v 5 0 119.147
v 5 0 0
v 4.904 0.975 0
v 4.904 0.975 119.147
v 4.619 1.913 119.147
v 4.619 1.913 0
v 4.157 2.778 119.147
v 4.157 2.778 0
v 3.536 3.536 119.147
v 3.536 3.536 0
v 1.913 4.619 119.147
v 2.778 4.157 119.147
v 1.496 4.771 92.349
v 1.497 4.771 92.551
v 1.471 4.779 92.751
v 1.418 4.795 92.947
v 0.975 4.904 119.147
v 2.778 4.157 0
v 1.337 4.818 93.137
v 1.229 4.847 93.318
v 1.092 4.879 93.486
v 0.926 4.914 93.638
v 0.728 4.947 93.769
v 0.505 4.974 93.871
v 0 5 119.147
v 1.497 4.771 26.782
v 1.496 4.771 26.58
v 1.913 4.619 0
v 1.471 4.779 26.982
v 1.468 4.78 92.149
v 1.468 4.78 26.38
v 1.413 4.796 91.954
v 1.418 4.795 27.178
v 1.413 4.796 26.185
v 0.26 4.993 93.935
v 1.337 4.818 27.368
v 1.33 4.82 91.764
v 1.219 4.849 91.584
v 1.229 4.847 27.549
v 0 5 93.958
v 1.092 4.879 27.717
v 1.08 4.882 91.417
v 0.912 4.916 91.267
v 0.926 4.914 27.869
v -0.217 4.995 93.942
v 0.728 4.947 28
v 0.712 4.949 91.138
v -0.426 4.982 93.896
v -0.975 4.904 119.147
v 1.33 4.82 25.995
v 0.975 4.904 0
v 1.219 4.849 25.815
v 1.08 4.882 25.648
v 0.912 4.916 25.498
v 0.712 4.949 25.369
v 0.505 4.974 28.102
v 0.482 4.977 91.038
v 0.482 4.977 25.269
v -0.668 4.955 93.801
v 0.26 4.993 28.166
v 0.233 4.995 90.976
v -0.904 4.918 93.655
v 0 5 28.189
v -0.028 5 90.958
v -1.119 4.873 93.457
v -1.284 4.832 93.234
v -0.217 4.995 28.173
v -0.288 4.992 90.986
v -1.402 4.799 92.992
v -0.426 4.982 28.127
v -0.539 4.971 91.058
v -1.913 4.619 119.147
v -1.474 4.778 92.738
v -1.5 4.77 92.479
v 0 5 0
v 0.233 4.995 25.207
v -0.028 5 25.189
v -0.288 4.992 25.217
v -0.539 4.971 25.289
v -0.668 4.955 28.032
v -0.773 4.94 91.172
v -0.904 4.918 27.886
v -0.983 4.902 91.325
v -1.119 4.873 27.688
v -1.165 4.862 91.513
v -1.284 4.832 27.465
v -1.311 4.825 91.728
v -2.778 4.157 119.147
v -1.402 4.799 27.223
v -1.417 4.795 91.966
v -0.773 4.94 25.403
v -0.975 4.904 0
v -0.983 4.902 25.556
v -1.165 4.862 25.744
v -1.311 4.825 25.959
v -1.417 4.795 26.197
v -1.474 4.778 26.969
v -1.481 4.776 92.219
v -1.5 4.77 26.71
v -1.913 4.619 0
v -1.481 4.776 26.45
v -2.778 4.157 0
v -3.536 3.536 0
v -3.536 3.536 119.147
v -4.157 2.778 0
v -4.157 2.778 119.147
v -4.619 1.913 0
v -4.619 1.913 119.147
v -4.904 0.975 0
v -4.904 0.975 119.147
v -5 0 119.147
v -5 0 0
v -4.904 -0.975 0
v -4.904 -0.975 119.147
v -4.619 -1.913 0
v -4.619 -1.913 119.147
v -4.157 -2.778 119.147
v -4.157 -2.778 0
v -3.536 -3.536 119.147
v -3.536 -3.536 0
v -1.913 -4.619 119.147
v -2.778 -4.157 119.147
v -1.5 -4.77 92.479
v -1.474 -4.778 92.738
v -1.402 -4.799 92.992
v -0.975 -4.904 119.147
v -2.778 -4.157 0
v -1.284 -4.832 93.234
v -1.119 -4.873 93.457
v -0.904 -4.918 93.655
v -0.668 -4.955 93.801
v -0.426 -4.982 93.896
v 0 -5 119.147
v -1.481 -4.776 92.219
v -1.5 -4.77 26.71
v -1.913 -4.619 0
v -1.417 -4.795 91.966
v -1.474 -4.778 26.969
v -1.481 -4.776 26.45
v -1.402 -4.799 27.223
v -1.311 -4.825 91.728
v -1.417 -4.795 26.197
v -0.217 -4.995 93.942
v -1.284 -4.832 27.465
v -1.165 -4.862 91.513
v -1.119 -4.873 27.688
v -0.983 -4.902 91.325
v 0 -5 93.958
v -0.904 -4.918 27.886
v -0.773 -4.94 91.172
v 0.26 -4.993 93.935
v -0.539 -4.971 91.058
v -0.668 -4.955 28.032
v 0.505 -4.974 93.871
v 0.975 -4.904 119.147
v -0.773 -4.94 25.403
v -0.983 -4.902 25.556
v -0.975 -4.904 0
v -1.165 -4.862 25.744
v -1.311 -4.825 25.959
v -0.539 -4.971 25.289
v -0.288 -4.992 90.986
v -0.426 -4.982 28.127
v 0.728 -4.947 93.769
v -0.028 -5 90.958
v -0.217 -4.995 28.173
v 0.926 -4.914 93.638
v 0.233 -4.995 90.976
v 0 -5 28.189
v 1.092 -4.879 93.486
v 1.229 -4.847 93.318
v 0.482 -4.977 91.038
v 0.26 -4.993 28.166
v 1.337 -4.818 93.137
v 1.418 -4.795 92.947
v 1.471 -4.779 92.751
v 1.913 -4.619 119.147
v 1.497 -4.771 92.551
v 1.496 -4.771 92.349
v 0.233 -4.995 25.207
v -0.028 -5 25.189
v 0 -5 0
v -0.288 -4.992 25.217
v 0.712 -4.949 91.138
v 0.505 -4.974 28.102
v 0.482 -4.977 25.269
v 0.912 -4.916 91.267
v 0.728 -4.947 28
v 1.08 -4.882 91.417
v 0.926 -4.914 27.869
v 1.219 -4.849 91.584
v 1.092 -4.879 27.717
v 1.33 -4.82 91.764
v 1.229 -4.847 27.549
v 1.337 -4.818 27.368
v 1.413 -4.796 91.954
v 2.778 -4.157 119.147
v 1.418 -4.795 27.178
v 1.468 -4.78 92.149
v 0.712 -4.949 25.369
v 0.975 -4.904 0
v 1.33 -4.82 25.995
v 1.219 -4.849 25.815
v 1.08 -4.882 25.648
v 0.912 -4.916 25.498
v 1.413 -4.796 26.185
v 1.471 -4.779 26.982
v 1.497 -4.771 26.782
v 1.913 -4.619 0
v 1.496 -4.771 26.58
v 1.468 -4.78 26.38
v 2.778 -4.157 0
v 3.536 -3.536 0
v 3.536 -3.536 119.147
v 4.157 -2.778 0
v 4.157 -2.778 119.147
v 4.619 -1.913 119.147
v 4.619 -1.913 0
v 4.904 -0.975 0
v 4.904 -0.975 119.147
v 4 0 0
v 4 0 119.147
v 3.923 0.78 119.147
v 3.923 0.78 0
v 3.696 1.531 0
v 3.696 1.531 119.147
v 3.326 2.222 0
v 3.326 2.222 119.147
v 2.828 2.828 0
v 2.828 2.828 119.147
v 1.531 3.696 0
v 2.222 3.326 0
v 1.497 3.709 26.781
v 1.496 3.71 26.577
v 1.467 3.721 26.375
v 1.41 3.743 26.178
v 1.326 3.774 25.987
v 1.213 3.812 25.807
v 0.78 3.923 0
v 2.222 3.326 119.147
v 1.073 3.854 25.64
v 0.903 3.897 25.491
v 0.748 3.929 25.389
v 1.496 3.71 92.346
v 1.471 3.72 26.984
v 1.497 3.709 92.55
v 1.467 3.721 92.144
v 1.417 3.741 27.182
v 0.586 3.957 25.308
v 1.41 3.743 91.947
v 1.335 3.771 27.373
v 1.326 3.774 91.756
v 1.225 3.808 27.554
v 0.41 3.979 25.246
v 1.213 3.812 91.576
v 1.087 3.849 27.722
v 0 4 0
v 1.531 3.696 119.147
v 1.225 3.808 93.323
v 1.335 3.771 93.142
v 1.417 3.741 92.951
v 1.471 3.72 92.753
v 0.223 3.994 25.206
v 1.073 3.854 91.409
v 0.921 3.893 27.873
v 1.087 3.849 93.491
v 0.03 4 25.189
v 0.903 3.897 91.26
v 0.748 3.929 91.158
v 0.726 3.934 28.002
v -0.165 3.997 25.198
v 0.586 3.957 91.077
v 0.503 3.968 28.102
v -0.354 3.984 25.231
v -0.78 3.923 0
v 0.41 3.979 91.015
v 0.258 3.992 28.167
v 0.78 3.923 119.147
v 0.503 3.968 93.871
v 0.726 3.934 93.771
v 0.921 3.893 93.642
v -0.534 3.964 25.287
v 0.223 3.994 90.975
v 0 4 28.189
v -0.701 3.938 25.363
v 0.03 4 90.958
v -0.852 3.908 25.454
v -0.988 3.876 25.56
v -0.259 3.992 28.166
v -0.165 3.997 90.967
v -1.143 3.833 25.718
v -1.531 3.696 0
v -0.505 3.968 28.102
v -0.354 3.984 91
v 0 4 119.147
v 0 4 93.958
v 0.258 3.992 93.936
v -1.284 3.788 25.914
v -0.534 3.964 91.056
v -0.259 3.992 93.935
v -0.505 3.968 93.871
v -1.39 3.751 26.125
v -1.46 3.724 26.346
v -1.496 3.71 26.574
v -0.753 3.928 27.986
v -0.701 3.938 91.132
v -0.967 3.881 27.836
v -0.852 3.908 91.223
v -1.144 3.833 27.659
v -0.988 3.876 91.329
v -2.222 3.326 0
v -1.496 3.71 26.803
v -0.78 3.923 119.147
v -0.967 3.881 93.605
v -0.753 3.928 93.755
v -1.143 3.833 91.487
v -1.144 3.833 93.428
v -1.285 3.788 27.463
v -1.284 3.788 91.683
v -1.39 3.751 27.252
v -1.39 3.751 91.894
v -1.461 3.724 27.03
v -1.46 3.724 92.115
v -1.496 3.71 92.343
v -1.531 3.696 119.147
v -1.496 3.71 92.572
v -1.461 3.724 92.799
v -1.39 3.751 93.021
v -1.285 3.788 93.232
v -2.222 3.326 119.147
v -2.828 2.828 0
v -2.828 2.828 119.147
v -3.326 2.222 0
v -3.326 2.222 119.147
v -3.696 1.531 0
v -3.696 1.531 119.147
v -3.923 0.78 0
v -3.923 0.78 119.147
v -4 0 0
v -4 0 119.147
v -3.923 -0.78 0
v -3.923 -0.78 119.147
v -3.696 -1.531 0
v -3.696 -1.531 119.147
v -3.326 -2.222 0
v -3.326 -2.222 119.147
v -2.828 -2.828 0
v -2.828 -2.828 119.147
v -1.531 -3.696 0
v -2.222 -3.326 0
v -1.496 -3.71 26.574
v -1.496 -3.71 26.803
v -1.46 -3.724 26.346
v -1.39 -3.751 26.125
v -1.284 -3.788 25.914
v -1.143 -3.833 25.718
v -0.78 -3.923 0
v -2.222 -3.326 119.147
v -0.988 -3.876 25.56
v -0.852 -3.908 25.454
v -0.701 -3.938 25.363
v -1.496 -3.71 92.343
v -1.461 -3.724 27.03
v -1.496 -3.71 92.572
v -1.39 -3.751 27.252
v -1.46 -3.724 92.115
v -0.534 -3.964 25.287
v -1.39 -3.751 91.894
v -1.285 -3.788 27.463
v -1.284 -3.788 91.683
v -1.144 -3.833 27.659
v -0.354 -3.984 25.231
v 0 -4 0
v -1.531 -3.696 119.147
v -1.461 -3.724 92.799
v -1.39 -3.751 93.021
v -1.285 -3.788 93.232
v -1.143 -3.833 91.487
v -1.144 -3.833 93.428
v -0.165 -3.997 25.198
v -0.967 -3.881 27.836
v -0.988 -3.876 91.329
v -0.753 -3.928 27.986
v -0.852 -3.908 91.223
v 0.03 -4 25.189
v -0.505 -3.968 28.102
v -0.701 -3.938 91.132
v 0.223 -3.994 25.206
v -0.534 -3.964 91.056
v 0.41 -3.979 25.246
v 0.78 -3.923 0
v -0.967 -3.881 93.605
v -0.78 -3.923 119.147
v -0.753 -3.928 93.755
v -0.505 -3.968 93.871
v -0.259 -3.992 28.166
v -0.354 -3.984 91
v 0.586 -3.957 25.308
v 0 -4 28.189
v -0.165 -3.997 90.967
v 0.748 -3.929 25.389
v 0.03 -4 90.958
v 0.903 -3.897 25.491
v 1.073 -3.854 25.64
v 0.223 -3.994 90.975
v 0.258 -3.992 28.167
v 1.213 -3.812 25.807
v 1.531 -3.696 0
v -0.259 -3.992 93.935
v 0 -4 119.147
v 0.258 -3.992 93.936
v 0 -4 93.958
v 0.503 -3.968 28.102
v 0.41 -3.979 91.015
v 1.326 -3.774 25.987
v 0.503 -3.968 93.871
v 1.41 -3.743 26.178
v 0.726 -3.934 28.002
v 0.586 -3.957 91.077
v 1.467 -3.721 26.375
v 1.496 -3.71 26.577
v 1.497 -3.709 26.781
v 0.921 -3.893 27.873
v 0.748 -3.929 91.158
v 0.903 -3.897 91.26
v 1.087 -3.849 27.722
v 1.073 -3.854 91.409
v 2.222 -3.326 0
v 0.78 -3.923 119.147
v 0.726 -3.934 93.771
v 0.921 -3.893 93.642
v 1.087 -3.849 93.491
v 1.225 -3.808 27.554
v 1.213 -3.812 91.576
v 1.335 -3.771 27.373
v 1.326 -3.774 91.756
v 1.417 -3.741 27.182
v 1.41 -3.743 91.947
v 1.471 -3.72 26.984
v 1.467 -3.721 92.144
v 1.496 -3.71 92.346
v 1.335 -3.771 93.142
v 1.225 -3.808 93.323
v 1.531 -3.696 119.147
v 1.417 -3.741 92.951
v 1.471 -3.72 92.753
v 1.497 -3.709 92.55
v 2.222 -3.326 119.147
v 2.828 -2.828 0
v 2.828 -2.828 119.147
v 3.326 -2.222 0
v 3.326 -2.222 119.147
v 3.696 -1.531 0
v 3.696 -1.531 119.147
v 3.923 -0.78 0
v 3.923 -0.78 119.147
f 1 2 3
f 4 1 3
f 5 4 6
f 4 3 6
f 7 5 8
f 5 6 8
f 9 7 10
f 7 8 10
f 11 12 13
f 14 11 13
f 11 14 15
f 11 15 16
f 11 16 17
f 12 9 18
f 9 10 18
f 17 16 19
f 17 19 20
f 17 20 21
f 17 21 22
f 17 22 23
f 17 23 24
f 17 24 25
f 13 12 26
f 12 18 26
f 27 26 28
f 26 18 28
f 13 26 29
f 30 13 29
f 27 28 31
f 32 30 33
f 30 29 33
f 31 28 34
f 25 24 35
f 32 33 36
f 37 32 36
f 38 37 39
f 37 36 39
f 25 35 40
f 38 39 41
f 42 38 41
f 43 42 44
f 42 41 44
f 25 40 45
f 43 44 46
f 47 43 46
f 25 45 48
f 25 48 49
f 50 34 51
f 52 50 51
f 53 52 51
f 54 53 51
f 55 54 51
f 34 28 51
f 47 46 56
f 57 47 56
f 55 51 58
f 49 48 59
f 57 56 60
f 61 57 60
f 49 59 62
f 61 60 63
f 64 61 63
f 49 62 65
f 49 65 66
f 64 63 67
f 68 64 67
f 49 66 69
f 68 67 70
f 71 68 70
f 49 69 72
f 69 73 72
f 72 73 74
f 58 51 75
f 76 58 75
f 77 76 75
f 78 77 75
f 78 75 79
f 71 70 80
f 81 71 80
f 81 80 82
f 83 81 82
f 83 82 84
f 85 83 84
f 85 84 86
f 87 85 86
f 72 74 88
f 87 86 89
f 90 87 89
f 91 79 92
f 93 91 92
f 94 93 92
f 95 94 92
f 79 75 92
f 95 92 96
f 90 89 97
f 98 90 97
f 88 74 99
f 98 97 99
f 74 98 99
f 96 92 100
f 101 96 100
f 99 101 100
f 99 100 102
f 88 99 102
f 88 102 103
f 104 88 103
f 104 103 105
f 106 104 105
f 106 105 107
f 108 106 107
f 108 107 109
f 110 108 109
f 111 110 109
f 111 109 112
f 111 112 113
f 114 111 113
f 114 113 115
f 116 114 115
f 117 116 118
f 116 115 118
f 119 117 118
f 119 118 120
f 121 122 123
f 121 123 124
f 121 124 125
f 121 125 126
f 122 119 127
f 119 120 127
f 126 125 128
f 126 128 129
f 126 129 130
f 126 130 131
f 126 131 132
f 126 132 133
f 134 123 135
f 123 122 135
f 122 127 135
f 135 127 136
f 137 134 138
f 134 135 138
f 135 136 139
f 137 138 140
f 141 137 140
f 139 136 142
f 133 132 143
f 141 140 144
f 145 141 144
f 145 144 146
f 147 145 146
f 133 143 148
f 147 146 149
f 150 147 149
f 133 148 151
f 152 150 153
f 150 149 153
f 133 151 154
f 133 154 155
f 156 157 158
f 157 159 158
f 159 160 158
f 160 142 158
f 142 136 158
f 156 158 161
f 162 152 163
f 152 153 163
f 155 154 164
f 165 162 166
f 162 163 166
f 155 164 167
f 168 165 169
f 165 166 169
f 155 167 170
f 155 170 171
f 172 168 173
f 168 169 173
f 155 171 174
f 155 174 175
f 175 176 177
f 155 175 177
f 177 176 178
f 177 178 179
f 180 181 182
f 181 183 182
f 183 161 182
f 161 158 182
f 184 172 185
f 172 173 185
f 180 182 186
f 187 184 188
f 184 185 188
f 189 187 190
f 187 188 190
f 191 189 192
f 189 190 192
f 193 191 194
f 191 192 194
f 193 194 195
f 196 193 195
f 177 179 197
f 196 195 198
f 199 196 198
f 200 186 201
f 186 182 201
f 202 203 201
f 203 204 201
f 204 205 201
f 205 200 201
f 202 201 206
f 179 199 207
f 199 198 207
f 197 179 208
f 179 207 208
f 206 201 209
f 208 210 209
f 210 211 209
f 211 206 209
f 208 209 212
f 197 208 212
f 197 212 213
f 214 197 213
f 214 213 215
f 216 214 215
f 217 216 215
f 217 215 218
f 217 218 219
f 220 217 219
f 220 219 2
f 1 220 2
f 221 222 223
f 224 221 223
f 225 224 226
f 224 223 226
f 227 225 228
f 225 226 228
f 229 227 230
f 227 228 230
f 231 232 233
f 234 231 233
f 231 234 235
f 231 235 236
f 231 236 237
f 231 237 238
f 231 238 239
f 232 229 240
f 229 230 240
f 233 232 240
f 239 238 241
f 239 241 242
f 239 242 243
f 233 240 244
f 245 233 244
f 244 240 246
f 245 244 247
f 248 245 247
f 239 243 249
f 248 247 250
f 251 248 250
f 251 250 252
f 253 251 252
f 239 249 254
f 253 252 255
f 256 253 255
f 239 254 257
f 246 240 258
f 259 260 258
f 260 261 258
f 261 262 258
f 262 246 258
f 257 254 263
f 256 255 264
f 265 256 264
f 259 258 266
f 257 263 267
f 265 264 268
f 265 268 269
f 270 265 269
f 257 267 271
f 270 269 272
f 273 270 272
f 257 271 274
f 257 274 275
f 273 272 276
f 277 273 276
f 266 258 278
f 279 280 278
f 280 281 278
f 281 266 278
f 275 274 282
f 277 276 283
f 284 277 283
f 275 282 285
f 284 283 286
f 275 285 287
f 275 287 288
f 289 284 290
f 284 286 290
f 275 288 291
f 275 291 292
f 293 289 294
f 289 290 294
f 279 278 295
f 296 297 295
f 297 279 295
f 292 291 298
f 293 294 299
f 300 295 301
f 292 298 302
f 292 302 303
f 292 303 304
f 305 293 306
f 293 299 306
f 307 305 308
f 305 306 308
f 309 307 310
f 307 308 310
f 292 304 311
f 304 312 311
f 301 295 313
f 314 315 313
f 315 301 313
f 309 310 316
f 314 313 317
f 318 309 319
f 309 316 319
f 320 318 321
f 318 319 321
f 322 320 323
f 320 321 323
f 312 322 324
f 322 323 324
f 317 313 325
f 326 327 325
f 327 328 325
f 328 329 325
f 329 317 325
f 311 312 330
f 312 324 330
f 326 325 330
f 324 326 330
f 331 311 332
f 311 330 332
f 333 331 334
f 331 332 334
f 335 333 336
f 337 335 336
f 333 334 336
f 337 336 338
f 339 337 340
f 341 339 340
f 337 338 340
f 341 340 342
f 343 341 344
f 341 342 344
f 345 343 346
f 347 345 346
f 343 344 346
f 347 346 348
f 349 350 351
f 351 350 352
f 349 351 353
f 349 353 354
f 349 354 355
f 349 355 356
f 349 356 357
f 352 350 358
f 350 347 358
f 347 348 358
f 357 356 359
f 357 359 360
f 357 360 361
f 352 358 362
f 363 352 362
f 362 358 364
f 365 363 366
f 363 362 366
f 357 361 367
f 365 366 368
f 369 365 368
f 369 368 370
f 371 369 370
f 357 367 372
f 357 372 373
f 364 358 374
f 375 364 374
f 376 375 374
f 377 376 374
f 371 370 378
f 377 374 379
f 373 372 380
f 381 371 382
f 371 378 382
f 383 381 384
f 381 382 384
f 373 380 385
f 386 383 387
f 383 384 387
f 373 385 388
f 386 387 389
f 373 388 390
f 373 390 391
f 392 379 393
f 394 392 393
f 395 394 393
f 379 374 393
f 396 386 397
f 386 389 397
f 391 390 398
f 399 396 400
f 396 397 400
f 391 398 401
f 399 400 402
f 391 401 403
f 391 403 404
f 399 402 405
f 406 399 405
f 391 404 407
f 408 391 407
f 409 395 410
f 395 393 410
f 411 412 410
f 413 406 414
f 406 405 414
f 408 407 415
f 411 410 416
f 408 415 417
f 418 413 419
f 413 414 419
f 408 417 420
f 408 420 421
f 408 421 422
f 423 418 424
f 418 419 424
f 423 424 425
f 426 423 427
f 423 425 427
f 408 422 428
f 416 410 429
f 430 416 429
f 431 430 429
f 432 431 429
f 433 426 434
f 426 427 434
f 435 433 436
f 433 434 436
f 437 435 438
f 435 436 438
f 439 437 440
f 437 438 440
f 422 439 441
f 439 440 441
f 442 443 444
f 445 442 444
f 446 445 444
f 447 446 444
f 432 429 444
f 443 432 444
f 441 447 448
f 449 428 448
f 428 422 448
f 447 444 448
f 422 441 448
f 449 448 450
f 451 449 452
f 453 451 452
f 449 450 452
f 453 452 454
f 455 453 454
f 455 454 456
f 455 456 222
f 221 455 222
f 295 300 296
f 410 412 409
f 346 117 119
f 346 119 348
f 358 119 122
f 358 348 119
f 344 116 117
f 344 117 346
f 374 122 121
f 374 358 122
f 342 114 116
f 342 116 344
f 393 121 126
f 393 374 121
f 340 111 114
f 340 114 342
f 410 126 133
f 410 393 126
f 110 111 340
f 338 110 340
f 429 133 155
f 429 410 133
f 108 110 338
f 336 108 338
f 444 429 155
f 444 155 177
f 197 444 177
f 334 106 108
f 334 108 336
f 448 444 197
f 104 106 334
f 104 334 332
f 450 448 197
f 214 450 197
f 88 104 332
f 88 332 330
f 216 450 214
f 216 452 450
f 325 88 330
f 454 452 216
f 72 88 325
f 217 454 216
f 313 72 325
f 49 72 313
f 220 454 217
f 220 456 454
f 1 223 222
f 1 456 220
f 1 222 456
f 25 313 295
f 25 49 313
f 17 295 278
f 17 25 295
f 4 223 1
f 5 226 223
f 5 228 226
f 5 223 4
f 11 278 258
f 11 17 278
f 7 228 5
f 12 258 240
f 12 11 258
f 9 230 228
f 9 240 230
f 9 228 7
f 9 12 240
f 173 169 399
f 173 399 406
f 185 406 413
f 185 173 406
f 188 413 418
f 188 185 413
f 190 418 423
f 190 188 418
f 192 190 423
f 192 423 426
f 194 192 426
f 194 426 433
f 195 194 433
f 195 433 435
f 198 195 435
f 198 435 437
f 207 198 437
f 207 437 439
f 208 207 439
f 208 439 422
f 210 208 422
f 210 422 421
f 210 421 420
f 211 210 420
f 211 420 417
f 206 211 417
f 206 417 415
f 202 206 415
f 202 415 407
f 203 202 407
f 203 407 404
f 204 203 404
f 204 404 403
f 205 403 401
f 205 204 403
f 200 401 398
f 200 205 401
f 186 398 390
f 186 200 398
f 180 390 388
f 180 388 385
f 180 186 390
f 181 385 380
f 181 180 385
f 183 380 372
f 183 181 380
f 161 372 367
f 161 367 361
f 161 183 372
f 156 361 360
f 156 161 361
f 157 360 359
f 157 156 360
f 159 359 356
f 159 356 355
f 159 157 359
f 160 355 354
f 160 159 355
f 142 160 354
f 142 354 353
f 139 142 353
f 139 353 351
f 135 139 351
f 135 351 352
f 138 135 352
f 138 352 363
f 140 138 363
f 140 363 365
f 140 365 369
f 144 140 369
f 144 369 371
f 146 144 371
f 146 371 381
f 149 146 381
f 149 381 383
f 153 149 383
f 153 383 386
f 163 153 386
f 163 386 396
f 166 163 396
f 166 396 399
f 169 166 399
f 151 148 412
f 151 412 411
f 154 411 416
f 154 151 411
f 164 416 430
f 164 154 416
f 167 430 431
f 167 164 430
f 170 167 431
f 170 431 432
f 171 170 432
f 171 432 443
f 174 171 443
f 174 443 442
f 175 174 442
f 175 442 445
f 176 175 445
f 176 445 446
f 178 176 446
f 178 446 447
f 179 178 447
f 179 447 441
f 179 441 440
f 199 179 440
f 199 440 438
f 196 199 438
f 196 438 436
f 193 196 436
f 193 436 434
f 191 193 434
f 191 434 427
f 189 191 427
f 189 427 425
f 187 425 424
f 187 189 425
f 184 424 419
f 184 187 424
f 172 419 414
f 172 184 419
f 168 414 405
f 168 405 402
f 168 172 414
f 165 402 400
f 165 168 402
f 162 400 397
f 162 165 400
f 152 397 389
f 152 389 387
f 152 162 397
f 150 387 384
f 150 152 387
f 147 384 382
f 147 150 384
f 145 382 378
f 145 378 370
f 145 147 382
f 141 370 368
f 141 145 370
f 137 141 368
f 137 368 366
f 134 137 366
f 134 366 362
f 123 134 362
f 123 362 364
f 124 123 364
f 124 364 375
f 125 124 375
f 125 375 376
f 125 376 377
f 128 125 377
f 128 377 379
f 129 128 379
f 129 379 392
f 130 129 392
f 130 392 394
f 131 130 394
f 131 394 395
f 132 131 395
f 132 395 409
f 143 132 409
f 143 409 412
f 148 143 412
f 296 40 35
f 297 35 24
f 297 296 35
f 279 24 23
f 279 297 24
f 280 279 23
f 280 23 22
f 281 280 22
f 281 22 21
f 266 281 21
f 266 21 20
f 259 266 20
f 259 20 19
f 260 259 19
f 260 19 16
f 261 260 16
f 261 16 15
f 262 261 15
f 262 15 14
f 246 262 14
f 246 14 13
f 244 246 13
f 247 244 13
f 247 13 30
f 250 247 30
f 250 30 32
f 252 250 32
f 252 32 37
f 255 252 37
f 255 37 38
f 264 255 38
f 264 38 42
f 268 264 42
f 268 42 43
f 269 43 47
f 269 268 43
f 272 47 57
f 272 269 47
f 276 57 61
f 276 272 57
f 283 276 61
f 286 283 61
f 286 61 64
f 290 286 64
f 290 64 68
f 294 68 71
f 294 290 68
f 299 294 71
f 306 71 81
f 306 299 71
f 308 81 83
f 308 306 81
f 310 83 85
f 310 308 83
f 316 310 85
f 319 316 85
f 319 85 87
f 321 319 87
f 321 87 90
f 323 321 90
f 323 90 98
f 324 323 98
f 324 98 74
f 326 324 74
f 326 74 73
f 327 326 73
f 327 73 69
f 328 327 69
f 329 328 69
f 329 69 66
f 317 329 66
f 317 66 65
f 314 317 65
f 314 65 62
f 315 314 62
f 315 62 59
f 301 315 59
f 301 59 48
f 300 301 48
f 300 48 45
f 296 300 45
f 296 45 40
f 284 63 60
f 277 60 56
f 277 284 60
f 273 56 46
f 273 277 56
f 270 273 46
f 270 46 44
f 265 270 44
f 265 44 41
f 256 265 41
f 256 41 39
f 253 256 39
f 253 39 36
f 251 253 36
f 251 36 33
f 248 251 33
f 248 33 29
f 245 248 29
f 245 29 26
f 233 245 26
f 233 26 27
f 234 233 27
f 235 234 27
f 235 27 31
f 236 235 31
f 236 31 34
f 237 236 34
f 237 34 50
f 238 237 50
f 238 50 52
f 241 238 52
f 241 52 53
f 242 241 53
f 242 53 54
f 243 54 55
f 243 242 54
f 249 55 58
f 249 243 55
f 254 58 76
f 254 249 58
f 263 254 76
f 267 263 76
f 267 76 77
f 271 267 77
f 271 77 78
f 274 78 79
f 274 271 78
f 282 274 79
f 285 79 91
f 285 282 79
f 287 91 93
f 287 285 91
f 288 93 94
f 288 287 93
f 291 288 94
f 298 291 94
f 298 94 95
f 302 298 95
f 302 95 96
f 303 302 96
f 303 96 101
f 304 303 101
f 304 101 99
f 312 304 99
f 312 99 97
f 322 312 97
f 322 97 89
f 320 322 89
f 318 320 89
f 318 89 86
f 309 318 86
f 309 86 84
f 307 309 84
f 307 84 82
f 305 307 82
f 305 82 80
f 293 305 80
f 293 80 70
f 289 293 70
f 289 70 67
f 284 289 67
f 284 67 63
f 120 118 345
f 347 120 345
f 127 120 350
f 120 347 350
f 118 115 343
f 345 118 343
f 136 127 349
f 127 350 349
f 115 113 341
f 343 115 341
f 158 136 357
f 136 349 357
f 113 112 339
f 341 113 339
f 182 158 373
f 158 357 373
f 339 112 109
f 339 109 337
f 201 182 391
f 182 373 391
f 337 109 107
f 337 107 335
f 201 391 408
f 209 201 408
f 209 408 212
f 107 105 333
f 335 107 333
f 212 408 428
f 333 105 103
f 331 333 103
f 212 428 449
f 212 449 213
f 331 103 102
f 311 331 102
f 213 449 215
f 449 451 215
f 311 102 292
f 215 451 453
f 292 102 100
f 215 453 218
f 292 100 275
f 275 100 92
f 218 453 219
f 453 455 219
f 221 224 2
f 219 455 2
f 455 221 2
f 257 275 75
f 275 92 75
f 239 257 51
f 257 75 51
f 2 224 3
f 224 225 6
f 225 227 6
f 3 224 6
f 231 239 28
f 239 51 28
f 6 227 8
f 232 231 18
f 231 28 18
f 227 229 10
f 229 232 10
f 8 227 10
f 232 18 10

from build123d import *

# Parameters (mm, degrees)
SKETCH1_R               = 5
BOSS_EXTRUDE1_DEPTH     = 119.147
CUT_EXTRUDE1_REACH      = 121.357
SKETCH2_R               = 4
CUT_EXTRUDE2_DEPTH      = 120.356640406
CUT_EXTRUDE2_DEPTH_BACK = 120.356640406
SKETCH5_R               = 1.5


with BuildPart() as part:
    # Sketch1 → Boss-Extrude1 (new body)
    with BuildSketch(Plane.XY):
        Circle(SKETCH1_R)
    extrude(amount=BOSS_EXTRUDE1_DEPTH)

    # Sketch2 → Cut-Extrude1 (cut, up to next)
    with BuildSketch(Plane.XY.offset(119.147), mode=Mode.PRIVATE) as cut_extrude1_sk1:
        Circle(SKETCH2_R)
    cut_extrude1_tool1 = extrude(cut_extrude1_sk1.sketch, amount=-CUT_EXTRUDE1_REACH, mode=Mode.PRIVATE) & part.part
    add(cut_extrude1_tool1.solids().sort_by_distance((0, 0, 119.147))[0], mode=Mode.SUBTRACT)

    # Sketch5 → Cut-Extrude2 (cut, two sides: drawn at the far end of the back side and taken through both)
    with BuildSketch(Plane(origin=(0, 0, 0), x_dir=(1, 0, 0), z_dir=(0, 1, 0)).offset(-CUT_EXTRUDE2_DEPTH_BACK)):
        with Locations(Location((0, -26.689, 0), (0, 0, 270))):
            Circle(SKETCH5_R)
        with Locations(Location((0, -92.458, 0), (0, 0, 270))):
            Circle(SKETCH5_R)
    extrude(amount=CUT_EXTRUDE2_DEPTH + CUT_EXTRUDE2_DEPTH_BACK, mode=Mode.SUBTRACT)


solid = part.part
